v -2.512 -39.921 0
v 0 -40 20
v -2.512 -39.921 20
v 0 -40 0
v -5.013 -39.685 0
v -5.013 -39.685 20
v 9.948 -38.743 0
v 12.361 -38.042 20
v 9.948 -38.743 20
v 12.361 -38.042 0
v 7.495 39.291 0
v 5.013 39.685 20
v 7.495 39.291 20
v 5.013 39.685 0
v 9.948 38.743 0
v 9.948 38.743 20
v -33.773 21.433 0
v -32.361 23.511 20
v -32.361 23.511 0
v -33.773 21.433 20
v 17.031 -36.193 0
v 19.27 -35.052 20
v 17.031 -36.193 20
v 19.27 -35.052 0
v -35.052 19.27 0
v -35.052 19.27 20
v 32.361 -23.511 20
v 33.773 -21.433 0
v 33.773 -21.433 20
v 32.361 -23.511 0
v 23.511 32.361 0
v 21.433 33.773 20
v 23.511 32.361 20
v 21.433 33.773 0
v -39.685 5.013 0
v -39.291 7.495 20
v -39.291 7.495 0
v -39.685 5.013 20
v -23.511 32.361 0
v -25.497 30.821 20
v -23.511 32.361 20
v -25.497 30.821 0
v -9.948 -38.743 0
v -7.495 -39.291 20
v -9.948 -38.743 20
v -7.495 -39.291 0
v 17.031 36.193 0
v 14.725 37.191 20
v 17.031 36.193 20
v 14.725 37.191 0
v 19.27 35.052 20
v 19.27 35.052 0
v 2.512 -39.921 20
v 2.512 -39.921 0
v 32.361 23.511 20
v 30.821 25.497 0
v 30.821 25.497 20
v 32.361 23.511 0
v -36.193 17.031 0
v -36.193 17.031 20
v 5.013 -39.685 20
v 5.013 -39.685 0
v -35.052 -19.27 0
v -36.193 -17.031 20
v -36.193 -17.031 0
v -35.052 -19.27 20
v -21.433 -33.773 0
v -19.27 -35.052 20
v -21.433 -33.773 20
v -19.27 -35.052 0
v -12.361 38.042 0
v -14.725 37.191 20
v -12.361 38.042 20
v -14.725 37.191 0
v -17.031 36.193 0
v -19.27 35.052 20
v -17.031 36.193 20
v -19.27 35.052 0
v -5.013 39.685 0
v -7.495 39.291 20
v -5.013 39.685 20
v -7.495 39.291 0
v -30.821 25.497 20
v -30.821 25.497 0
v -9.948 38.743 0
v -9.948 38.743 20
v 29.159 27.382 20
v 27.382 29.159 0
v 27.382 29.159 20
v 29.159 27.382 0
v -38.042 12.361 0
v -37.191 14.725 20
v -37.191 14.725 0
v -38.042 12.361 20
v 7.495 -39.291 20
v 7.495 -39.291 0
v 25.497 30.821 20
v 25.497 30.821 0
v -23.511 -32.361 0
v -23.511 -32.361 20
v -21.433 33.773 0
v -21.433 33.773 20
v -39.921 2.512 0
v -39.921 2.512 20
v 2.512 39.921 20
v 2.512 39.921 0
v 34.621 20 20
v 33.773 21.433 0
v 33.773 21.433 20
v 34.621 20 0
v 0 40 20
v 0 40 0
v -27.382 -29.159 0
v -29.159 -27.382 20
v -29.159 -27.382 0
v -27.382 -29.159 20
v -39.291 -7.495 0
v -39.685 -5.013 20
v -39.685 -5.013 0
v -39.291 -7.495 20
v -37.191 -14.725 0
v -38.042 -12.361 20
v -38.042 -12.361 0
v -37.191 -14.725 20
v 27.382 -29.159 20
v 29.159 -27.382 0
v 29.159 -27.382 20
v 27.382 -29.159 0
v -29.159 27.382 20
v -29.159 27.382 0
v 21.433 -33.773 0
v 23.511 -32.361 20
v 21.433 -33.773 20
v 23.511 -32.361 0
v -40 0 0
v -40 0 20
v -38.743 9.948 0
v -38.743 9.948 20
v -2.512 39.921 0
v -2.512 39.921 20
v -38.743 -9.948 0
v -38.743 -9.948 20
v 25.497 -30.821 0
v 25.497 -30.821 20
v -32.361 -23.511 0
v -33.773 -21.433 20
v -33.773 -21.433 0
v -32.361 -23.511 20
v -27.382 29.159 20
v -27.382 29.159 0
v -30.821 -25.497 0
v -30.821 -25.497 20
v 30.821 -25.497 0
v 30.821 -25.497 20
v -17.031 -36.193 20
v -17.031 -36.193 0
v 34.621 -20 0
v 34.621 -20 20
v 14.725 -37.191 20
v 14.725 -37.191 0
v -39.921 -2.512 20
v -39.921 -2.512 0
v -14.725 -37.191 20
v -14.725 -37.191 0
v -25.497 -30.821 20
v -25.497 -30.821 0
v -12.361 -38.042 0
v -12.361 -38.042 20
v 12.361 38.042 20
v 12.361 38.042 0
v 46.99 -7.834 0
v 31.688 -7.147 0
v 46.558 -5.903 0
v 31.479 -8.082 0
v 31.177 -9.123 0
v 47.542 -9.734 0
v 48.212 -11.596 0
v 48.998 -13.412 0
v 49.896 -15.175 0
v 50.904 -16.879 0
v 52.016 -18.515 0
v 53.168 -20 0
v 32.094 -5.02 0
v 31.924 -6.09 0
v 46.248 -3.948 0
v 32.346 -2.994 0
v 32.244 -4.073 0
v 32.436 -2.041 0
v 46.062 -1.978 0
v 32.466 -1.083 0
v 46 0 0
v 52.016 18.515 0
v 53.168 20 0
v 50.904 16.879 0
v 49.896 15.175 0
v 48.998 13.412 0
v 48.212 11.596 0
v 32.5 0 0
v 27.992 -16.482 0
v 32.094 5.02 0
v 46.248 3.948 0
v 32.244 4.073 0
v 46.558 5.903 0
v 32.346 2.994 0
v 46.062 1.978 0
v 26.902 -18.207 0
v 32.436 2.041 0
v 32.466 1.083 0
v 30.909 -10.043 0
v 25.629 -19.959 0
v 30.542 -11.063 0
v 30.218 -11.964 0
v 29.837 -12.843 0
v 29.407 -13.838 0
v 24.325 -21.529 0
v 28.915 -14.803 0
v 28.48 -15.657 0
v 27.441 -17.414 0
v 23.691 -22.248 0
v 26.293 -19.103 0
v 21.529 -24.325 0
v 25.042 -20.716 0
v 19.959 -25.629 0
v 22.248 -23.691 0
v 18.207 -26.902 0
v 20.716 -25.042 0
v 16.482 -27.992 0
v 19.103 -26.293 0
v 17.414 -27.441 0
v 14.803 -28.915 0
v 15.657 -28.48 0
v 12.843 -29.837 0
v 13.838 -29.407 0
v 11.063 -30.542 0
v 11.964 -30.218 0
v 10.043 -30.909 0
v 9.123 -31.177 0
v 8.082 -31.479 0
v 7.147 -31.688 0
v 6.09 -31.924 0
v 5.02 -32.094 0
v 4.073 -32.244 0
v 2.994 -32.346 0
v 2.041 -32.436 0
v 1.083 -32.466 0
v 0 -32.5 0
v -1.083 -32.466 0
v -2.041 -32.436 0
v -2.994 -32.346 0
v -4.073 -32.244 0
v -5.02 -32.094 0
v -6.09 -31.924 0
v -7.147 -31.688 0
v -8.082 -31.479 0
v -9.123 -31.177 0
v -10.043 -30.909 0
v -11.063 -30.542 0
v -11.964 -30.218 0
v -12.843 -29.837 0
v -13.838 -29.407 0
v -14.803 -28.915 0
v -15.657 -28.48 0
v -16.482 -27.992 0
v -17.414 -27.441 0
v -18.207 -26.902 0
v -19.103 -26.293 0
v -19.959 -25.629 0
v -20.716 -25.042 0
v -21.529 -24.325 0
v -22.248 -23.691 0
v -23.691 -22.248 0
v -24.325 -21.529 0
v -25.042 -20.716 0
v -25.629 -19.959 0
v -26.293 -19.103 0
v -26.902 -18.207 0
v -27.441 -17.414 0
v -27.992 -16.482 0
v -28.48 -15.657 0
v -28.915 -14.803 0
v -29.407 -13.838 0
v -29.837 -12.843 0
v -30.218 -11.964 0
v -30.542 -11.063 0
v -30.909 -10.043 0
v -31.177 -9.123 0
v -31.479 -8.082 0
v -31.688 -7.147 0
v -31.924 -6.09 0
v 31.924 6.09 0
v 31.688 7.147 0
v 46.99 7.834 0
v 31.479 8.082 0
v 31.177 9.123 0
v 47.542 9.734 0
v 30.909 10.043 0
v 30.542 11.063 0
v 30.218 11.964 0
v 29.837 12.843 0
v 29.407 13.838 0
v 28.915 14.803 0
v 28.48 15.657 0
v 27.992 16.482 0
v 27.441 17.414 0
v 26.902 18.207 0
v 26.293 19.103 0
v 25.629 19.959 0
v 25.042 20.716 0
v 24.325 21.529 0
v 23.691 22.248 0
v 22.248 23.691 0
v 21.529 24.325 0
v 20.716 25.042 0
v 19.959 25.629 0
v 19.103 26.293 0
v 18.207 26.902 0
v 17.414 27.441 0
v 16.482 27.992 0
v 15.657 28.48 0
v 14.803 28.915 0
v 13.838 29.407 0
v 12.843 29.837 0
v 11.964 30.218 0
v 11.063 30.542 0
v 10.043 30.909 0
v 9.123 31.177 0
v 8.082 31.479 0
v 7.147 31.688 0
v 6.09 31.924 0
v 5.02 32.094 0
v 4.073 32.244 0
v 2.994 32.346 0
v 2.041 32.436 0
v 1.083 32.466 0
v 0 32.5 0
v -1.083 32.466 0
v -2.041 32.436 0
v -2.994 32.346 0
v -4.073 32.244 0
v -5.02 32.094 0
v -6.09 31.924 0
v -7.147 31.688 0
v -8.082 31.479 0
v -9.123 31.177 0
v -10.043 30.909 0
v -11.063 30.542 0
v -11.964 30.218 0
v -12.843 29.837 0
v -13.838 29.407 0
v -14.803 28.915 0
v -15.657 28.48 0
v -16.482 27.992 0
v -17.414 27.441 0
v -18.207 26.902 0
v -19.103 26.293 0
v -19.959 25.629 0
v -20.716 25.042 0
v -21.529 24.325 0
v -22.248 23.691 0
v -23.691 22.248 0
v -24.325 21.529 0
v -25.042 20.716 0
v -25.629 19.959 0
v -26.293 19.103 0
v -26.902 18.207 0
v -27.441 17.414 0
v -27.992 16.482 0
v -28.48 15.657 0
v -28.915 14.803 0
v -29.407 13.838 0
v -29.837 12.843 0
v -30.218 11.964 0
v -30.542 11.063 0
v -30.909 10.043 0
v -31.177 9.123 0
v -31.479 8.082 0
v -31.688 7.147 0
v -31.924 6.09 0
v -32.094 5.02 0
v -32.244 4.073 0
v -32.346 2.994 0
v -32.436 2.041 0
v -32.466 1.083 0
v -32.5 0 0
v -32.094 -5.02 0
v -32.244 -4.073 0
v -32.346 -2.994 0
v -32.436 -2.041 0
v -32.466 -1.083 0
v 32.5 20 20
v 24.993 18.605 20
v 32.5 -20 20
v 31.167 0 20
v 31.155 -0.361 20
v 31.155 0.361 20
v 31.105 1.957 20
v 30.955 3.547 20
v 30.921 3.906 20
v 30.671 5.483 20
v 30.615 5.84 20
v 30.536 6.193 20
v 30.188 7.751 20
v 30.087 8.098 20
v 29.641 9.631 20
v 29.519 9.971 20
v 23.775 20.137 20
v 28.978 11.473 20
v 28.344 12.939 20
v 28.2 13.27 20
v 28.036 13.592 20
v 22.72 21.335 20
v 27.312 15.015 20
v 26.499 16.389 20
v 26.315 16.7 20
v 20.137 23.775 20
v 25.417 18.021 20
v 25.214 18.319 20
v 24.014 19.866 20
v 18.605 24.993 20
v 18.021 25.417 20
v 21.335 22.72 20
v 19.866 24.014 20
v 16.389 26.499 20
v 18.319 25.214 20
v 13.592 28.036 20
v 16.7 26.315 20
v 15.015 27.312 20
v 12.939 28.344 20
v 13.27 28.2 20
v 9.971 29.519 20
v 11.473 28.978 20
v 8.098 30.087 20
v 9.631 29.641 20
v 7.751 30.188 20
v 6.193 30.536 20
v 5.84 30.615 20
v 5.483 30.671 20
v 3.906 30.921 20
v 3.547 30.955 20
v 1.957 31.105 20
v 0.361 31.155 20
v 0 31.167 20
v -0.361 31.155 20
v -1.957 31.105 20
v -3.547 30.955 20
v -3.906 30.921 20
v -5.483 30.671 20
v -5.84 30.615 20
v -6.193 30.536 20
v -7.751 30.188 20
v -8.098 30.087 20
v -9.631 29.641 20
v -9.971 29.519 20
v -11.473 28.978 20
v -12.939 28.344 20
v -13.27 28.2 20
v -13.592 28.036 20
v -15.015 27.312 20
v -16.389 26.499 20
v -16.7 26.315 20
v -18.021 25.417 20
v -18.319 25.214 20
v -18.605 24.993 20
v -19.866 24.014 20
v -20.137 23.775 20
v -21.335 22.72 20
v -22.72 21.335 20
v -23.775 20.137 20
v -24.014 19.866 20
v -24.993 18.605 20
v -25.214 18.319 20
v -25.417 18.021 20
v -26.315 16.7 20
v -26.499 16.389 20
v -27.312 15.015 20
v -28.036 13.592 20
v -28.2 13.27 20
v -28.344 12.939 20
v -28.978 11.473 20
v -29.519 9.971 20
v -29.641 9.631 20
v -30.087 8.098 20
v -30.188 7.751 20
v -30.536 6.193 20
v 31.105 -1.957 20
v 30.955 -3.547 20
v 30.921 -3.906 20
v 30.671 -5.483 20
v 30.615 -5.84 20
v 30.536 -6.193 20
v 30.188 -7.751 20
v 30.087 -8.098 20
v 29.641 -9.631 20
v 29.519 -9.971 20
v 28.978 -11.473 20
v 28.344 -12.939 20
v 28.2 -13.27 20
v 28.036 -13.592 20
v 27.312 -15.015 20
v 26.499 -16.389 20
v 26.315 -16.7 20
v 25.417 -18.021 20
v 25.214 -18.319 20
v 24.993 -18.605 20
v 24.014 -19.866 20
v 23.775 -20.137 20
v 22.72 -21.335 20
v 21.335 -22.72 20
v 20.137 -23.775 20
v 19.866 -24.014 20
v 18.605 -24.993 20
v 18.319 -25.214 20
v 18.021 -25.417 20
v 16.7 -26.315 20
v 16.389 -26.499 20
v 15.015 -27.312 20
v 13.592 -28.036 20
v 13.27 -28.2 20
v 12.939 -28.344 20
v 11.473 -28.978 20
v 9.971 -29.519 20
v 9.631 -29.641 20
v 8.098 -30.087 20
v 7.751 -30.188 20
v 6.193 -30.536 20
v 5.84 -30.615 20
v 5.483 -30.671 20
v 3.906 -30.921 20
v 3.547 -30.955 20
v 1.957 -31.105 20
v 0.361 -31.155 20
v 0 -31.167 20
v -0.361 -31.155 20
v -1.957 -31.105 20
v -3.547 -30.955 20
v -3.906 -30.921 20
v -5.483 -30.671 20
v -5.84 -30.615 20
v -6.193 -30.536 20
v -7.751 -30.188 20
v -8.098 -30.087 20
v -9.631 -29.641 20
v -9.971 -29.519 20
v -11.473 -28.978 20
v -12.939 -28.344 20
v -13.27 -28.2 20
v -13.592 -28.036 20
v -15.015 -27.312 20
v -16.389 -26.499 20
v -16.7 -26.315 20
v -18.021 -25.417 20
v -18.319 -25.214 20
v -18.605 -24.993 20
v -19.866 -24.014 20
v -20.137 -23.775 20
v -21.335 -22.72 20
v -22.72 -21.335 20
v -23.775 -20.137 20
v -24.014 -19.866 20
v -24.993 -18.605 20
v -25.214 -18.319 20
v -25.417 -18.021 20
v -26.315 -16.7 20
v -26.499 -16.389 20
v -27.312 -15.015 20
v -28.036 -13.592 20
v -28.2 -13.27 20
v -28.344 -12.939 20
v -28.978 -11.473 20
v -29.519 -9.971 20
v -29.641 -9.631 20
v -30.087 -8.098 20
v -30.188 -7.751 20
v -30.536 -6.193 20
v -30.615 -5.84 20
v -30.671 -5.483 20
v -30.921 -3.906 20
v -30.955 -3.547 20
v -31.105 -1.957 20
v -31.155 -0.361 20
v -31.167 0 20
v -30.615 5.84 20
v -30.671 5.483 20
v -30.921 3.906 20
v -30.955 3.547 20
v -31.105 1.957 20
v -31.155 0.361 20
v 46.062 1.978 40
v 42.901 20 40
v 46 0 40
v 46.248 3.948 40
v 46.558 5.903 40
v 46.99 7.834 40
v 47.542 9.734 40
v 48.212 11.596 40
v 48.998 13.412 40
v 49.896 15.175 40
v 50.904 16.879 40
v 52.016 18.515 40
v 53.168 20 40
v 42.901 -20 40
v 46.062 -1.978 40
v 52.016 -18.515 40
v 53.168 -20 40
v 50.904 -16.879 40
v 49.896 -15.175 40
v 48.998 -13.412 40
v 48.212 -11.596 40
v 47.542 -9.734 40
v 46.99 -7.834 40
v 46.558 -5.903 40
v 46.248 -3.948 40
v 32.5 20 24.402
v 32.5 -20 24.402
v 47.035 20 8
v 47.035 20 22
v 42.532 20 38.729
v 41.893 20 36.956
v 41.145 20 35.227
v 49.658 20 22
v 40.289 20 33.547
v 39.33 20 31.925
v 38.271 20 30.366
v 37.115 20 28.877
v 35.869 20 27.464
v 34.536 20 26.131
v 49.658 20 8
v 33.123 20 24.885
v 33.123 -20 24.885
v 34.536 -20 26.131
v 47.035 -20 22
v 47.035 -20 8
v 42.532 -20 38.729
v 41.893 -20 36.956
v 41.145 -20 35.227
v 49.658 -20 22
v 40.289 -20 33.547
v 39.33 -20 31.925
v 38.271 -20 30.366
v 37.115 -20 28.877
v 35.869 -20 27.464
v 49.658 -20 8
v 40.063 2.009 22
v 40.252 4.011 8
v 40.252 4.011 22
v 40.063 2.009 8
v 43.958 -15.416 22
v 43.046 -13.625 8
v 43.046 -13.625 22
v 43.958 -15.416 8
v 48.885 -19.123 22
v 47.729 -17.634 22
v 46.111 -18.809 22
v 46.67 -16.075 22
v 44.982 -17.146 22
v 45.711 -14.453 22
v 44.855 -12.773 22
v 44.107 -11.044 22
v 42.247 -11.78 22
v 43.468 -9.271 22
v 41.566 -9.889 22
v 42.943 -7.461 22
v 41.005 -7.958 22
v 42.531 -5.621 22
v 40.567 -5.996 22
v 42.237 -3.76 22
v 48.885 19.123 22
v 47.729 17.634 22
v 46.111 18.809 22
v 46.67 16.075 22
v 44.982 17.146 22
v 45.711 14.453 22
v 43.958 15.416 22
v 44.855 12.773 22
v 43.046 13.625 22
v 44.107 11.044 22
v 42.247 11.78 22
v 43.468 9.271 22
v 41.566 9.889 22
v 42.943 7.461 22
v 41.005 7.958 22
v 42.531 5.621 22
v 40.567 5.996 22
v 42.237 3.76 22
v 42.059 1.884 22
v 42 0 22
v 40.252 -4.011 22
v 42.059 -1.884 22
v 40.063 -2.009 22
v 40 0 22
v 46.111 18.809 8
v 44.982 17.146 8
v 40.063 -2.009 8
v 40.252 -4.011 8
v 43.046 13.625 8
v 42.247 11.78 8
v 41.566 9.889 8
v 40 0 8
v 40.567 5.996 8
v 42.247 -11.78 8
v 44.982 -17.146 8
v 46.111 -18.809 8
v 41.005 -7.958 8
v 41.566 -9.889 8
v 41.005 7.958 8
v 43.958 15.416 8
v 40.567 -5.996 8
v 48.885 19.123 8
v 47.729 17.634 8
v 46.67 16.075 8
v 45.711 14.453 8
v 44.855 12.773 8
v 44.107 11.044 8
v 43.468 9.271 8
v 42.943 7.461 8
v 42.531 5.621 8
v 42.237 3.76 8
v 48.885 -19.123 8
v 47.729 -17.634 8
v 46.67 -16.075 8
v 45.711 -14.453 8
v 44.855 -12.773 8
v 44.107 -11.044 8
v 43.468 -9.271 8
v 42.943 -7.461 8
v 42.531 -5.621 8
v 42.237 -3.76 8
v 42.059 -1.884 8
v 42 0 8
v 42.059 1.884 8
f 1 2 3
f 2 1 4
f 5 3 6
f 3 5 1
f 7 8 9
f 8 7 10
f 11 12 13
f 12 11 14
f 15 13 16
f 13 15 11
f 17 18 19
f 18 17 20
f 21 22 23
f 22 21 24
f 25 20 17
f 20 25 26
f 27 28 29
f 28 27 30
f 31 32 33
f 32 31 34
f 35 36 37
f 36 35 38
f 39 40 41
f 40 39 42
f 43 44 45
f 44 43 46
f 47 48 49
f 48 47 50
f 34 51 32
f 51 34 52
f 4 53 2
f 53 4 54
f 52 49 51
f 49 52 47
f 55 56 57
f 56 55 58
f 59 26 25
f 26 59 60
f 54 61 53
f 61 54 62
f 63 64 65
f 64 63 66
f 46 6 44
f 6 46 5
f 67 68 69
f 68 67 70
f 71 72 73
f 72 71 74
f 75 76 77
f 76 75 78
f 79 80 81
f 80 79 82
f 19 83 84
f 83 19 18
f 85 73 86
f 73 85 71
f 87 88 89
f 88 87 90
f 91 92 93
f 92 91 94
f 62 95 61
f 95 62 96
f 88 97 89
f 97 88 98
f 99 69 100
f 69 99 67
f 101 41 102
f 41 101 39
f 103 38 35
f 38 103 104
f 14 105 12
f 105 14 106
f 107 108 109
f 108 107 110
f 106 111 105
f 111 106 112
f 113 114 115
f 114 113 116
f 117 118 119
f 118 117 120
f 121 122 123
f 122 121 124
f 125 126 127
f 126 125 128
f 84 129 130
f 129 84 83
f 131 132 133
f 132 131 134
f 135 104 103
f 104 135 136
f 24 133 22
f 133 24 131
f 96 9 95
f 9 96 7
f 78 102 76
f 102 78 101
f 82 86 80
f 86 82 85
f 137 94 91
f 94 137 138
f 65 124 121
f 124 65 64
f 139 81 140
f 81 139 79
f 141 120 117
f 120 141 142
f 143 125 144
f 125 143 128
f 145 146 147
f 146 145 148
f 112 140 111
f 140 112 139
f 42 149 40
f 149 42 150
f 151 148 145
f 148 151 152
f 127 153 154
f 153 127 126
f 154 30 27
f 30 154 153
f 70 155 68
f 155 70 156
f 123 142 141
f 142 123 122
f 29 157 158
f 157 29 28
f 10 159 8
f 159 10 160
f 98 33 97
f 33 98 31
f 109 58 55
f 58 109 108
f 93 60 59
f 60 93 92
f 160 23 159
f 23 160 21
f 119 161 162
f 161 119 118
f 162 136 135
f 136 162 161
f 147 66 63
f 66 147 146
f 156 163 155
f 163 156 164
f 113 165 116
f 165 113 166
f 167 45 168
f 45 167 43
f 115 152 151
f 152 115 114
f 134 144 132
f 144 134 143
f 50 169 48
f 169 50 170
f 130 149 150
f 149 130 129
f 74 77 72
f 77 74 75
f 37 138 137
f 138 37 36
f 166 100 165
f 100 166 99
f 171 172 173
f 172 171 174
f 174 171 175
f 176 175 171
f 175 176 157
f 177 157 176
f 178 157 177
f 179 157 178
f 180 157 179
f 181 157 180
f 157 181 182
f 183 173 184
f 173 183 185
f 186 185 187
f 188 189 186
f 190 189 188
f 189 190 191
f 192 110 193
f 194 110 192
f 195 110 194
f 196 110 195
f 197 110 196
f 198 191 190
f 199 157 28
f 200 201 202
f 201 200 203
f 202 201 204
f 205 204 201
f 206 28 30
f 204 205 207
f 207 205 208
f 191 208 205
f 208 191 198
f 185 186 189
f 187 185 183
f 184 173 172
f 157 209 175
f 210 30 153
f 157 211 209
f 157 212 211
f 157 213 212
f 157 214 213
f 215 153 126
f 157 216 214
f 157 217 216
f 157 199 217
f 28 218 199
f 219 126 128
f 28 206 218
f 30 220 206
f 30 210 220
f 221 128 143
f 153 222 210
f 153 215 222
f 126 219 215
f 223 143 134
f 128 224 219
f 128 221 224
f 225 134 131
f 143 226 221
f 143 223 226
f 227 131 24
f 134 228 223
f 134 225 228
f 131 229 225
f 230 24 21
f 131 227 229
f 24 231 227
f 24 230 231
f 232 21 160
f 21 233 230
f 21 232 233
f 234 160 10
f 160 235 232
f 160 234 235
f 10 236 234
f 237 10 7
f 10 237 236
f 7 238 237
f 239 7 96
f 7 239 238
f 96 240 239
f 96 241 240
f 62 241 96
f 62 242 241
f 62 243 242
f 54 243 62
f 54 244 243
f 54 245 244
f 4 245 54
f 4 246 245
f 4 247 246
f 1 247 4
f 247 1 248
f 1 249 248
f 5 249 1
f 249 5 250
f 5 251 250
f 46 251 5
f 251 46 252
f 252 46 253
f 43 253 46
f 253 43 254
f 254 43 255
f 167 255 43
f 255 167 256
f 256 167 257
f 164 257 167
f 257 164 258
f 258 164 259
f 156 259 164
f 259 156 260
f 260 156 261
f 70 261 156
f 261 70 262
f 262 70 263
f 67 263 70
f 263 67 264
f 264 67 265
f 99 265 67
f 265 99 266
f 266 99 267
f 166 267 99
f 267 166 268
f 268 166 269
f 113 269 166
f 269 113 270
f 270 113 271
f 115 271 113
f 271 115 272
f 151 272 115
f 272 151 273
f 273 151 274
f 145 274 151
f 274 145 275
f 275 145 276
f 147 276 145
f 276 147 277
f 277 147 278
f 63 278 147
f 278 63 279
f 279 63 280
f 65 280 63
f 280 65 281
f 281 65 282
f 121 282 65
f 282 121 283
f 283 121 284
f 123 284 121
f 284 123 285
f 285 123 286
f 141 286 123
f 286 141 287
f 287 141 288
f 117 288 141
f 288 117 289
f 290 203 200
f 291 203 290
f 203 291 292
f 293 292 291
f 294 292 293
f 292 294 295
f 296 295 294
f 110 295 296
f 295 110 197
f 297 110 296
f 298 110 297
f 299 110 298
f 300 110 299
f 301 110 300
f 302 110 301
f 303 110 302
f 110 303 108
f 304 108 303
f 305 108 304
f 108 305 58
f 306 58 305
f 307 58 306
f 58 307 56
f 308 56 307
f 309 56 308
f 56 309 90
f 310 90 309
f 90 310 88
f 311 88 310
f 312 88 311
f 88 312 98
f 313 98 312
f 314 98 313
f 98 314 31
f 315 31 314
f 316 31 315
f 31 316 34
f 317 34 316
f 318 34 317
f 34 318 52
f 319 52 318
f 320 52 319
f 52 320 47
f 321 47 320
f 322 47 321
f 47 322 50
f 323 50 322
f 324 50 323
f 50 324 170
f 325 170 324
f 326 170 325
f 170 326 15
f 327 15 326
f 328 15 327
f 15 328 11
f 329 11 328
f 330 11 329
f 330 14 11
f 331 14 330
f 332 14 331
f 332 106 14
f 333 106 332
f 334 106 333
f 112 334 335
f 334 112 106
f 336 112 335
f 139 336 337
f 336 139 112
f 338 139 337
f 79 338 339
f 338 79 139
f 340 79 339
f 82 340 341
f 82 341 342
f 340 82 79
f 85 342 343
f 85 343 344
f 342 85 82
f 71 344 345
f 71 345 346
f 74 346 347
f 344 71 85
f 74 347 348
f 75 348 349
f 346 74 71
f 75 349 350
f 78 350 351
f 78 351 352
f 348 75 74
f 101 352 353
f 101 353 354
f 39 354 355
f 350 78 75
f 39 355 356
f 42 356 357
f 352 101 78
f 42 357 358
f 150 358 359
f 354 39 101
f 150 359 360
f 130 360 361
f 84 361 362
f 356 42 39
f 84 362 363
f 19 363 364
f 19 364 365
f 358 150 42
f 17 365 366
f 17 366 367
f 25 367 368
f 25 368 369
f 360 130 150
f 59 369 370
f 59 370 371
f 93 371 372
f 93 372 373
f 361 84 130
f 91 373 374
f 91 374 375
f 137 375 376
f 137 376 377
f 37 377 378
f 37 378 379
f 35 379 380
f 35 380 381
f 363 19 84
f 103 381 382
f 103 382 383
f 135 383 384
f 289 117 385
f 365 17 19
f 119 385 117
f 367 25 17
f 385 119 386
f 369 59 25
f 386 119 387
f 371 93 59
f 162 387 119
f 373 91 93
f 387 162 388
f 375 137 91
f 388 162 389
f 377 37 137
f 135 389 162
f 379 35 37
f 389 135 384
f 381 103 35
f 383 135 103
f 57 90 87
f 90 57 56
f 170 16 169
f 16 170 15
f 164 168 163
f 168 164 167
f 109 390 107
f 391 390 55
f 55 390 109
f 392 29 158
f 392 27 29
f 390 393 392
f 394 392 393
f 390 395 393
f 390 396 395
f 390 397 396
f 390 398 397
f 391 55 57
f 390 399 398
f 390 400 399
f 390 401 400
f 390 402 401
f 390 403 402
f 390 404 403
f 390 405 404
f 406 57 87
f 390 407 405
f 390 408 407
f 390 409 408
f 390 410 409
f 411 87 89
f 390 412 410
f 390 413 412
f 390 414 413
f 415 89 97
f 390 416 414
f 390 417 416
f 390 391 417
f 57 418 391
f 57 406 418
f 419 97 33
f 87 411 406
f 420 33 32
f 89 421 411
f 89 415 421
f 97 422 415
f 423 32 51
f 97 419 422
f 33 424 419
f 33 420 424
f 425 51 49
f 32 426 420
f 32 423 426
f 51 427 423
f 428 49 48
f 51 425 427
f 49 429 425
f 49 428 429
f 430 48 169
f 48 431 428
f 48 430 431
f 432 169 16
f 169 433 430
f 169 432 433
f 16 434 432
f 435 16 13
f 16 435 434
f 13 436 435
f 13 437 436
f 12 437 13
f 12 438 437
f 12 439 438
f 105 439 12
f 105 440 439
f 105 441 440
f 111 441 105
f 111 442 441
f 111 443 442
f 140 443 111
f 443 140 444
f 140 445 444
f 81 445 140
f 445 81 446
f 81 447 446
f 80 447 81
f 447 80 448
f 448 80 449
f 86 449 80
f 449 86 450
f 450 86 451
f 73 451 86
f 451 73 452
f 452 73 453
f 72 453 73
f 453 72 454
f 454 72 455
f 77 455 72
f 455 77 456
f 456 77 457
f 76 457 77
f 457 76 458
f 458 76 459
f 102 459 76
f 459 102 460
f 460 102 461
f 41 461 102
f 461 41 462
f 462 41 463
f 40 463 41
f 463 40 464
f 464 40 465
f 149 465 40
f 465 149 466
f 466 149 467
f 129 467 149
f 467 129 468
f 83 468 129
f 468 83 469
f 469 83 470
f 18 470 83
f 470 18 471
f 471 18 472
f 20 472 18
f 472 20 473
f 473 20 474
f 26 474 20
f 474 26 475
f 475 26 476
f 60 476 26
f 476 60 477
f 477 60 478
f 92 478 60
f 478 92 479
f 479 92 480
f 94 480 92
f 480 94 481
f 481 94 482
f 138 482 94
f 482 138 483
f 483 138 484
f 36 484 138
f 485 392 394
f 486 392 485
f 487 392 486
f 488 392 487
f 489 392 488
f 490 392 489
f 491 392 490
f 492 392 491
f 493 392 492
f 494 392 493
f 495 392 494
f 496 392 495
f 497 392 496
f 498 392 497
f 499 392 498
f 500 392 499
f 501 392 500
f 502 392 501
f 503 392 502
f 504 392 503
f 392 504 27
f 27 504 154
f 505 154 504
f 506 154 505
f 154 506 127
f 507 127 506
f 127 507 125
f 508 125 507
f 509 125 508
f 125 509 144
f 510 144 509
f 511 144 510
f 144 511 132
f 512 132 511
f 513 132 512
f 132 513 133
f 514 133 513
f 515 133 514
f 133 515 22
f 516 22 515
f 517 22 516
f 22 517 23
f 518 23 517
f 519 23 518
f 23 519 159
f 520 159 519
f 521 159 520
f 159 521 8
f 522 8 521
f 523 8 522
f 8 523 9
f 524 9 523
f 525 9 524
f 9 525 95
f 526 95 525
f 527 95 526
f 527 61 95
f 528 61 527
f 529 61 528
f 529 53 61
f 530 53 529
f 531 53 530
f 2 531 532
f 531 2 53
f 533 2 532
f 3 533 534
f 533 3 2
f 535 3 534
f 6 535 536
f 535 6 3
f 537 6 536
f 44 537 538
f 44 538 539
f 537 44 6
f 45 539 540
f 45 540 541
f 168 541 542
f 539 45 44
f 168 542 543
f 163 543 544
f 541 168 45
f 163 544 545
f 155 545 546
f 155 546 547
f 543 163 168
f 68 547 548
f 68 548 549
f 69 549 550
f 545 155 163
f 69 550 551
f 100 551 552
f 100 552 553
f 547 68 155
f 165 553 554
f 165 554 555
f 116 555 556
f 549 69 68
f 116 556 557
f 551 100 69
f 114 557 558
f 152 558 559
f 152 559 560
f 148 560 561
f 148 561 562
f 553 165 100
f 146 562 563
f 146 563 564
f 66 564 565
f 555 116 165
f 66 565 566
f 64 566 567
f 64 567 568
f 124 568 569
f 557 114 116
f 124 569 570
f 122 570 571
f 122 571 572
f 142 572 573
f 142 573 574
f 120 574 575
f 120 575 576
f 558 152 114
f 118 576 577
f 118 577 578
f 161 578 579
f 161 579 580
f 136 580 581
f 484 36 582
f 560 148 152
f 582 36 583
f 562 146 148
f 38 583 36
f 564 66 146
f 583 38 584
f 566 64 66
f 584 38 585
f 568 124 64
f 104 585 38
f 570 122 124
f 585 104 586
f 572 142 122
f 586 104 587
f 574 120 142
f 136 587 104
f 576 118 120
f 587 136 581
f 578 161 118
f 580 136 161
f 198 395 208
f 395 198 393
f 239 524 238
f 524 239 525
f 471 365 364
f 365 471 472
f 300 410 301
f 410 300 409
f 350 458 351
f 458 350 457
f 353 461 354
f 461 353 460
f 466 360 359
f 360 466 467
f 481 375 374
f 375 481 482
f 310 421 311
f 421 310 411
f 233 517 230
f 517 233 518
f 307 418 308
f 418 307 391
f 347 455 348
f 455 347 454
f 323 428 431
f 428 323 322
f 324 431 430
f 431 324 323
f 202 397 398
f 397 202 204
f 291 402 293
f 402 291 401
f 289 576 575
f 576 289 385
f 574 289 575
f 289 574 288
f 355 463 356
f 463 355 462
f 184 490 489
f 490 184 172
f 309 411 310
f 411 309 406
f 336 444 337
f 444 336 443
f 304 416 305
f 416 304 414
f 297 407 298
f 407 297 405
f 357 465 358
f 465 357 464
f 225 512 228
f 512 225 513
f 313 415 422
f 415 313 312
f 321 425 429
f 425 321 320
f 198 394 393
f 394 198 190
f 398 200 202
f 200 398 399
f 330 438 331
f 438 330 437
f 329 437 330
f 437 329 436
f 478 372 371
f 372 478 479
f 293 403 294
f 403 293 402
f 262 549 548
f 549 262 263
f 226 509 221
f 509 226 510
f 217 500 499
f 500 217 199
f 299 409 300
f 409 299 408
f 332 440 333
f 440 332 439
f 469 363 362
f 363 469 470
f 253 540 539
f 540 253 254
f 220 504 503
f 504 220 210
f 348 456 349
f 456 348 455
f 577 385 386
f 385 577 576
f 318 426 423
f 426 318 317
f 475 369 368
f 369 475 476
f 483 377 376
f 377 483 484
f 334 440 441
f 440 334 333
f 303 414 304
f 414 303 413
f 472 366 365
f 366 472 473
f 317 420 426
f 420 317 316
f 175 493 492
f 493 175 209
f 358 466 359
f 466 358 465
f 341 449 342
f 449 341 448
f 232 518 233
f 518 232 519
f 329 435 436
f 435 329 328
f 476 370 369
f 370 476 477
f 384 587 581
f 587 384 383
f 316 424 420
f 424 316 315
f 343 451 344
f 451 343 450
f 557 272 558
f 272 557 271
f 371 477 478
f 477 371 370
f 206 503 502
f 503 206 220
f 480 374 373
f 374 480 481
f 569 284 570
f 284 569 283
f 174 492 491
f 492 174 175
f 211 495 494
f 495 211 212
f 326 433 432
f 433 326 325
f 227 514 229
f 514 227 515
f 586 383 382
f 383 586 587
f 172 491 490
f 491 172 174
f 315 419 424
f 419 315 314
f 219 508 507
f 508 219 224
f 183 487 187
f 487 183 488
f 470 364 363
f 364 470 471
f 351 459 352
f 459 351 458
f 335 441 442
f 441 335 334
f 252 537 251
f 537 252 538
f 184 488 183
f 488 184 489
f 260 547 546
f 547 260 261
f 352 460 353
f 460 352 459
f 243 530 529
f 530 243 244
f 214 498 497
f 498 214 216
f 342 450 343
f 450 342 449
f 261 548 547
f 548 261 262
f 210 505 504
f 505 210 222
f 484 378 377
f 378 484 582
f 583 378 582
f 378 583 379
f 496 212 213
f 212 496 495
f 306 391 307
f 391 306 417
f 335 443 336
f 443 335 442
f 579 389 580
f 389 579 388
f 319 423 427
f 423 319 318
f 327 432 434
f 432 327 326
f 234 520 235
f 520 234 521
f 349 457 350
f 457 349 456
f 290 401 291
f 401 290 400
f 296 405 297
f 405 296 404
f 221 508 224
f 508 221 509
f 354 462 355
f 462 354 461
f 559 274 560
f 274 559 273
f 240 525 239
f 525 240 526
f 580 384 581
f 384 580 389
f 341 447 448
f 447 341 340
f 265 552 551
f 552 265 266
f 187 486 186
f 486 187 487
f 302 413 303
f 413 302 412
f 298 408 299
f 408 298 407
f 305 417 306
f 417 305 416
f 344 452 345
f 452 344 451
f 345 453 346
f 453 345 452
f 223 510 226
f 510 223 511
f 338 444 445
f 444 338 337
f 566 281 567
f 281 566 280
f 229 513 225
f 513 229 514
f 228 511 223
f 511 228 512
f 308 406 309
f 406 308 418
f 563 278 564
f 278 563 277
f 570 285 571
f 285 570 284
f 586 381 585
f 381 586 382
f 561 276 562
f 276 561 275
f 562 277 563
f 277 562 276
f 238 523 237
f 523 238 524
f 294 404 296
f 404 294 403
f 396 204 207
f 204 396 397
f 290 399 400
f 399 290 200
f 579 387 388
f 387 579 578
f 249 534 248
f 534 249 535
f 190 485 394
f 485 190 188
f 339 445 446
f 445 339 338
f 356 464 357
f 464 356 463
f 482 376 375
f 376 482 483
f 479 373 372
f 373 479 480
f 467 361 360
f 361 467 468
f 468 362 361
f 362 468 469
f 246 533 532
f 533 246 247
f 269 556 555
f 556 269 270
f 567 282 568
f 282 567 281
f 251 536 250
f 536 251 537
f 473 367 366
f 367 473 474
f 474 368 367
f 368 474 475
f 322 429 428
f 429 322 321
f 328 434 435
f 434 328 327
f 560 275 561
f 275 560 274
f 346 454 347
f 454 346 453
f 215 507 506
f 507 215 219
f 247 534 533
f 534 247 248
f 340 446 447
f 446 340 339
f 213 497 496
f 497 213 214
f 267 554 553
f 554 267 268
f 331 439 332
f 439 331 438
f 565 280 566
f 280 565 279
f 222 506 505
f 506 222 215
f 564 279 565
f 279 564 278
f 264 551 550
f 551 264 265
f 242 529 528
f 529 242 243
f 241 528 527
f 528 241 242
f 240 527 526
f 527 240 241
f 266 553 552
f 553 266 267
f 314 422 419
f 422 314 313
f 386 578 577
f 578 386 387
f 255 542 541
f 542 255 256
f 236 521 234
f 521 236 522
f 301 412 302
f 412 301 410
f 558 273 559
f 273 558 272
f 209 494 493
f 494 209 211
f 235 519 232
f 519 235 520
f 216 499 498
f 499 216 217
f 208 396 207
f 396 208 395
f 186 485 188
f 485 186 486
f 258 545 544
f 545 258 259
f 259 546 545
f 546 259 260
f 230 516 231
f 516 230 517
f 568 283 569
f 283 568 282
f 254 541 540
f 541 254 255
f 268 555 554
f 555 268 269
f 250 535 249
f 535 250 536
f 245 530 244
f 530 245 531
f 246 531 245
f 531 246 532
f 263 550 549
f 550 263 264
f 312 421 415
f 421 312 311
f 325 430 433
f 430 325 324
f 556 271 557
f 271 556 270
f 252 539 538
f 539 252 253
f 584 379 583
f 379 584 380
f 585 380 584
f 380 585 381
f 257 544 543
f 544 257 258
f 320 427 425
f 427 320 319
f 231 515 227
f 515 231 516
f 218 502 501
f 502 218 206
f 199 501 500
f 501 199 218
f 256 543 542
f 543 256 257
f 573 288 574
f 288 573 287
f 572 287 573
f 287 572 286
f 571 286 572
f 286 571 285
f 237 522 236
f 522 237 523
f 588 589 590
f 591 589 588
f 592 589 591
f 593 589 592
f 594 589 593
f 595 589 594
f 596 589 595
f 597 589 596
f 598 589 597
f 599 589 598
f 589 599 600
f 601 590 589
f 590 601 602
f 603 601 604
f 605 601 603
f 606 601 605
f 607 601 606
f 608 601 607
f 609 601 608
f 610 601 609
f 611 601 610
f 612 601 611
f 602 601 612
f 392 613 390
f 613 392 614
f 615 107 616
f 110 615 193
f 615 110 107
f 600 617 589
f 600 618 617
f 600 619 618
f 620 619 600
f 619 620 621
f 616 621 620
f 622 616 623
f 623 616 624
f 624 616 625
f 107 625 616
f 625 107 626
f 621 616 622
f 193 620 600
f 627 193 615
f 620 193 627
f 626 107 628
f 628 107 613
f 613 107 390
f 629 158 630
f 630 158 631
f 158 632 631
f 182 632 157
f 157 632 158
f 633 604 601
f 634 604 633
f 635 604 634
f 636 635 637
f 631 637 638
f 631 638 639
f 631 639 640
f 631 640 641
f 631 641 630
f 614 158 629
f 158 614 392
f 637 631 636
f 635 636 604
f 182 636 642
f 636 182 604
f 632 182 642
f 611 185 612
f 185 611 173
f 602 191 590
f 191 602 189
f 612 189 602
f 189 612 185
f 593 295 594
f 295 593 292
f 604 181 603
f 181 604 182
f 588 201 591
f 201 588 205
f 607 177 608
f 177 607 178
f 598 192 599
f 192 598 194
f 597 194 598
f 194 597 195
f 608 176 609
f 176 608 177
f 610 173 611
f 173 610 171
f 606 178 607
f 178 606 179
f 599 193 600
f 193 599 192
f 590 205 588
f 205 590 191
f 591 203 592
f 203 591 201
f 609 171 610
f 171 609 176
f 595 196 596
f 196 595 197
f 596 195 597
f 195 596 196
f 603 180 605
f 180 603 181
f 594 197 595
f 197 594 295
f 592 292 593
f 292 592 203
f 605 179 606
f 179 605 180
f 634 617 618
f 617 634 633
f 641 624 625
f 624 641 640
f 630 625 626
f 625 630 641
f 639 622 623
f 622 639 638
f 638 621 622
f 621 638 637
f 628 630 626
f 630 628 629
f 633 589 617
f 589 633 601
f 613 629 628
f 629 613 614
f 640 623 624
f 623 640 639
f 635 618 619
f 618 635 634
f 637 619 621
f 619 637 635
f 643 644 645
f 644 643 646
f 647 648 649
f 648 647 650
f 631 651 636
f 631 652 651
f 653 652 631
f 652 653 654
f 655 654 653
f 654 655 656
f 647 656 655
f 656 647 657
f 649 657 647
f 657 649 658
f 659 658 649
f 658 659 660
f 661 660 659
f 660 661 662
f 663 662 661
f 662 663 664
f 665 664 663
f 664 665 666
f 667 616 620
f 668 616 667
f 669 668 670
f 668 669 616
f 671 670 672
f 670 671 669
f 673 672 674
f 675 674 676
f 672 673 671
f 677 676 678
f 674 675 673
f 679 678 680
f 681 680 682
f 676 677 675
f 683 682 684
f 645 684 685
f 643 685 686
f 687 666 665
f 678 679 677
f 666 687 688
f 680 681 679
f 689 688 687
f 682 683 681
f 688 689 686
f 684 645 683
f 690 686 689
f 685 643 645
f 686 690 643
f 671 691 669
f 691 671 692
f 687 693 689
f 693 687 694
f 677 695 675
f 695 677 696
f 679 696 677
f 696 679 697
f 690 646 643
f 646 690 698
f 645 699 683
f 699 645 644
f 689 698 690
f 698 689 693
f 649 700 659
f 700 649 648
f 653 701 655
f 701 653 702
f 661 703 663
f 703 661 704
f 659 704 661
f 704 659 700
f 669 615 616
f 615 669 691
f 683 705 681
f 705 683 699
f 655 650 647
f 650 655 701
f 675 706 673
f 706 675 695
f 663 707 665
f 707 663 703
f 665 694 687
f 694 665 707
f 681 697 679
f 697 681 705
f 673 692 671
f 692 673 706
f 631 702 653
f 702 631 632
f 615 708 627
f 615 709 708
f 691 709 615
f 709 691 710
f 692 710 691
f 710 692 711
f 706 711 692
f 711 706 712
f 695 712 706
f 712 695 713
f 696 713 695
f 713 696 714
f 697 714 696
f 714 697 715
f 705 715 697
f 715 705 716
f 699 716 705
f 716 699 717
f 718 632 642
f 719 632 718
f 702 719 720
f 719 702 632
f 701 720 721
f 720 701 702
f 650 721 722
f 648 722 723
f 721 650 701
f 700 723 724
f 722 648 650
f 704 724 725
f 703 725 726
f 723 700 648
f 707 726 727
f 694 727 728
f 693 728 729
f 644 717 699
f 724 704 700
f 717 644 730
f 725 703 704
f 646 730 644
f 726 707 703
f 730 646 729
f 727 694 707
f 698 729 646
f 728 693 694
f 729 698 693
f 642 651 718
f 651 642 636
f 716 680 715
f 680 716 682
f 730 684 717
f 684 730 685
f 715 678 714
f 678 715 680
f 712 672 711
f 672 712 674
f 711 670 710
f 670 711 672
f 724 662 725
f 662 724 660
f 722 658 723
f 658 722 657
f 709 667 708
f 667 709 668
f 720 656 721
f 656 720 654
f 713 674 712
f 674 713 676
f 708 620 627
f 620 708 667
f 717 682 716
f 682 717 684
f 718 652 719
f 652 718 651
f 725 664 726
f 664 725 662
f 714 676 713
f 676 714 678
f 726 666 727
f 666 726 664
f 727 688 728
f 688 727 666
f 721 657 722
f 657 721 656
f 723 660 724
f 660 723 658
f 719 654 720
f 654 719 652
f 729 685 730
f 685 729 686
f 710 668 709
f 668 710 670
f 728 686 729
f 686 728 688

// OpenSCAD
/* NOTES:
	writecylinder(text="text",where=[0,0,0],radius=20,height=40);
	
	Required Parameters (If supplied in this order, identifier is not required)
		text="text"	 	: Text to be written
		where=[x,y,z]	: coordinates of cylinder
		radius=mm 		: radius of cylinder
		height=mm 		: height of cylinder

	Optional Parameter:
		center=boolean :	use this to specify that cylinder is centered on coordinates
					(default is center=false)
		face="top" : Top of cylinder
		face="bottom": bottom of cylinder
		face="front" :barrel of cylinder (default if not supplied)	

	Optional Parameters: (face is not "top" or "bottom")
		east=degrees : west= degrees: (moves text east or west around z)
		up=mm or down=mm : moves text up or down along Z axis
		rotate=degrees : rotates text around Y axis (spirals around cylinder)
	
	Optional Parameters: (face="top" or face="bottom")
		east=degrees or west=degrees : rotate text east or west around top
		rotate=degrees : (similar to east west but not dependant on text orientation)
		ccw=boolean : If true, writes in a counter clockwise direction. (default=false)
		middle=mm :moves the text ?mm toward center of top or bottom surface 	

*/

use <WriteSVG.scad>


 //-- Parmetros del vaso
/* grosor = 20;
 diam_ext=80;
 diam_int = 63.3; 
 texto = "Gonzalo";
diam_tubo = 60;
*/

// Aro
module aro(grosor_aro=20,  diam_ext=80, diam_int = 63.3, texto = "Claudia")
{
 // Exterior Aro
 difference(){
  difference() {
     //-- Base de la rueda
    cylinder(r=diam_ext/2,h=grosor_aro,  $fn=100);
	rotate([0,180,-90])
	translate([0,0,-20])
    	writecylinder(texto,[0,0,0],diam_ext/2-0.7,grosor_aro);
   } 

    //-- Taladro aro
   cylinder(r1=diam_int/2+2, r2=diam_int/2-2,h=grosor_aro*3,$fn=100,center=true);
 }
}

//Base asa
module base_asa(altura=40, diam_int = 63.3, diam_ext=80, diam_tubo = 60)
{
difference(){
difference(){
 translate([diam_int/2,-20,0])
 cube([30,40,altura]);

translate([(diam_ext+diam_tubo)/2+6,0,altura/2])
  cylinder(r=diam_tubo/2, h=altura*2,$fn=100,center=true);
}

translate([14,21,48])
rotate([90,0,0])
cylinder(r=60/2,h=42,  $fn=100);
}
}

//Cuerpdel soporte del vaso
module cuerpo_sv(grosor_aro=20,  diam_ext=80, diam_int = 65, texto = "Claudia",altura=40, diam_tubo = 63){
 aro(grosor_aro,  diam_ext, diam_int, texto);
 base_asa(altura, diam_int, diam_ext, diam_tubo);
}

module agarradera( diam_ext=80, diam_int = 63.3, altura_ag=12, ancho_ag=2, diam_tubo = 60){
difference(){
  	translate([(diam_ext+diam_tubo)/2+3,0,0])
	cylinder(r=diam_tubo/2+ancho_ag, h=altura_ag,$fn=100);

  	translate([(diam_ext+diam_tubo)/2+3,0,-altura_ag*2])
	cylinder(r=diam_tubo/2, h=altura_ag*4,$fn=100);
}
}

module agarraderas( altura_asa=40, diam_ext=78, diam_int = 63.3, altura_ag=14, ancho_ag=2, diam_tubo = 60){
separacion=(altura_asa-altura_ag*2)/3;
translate([0,0,separacion*2])
agarradera(diam_ext, diam_int , altura_ag, ancho_ag, diam_tubo );

// Una agarradera es suficiente. La de más abajo no es necesaria
/*translate([0,0,separacion*2+altura_ag])
agarradera(diam_ext, diam_int , altura_ag, ancho_ag, diam_tubo );
*/
}

module soporte_vaso(){
	difference(){	
		cuerpo_sv();
		agarraderas();
	}
}
/*difference(){	
soporte_vaso();
color("Red")
translate([14,21,48])
rotate([90,0,0])
cylinder(r=60/2,h=42,  $fn=100);
}*/

soporte_vaso();
